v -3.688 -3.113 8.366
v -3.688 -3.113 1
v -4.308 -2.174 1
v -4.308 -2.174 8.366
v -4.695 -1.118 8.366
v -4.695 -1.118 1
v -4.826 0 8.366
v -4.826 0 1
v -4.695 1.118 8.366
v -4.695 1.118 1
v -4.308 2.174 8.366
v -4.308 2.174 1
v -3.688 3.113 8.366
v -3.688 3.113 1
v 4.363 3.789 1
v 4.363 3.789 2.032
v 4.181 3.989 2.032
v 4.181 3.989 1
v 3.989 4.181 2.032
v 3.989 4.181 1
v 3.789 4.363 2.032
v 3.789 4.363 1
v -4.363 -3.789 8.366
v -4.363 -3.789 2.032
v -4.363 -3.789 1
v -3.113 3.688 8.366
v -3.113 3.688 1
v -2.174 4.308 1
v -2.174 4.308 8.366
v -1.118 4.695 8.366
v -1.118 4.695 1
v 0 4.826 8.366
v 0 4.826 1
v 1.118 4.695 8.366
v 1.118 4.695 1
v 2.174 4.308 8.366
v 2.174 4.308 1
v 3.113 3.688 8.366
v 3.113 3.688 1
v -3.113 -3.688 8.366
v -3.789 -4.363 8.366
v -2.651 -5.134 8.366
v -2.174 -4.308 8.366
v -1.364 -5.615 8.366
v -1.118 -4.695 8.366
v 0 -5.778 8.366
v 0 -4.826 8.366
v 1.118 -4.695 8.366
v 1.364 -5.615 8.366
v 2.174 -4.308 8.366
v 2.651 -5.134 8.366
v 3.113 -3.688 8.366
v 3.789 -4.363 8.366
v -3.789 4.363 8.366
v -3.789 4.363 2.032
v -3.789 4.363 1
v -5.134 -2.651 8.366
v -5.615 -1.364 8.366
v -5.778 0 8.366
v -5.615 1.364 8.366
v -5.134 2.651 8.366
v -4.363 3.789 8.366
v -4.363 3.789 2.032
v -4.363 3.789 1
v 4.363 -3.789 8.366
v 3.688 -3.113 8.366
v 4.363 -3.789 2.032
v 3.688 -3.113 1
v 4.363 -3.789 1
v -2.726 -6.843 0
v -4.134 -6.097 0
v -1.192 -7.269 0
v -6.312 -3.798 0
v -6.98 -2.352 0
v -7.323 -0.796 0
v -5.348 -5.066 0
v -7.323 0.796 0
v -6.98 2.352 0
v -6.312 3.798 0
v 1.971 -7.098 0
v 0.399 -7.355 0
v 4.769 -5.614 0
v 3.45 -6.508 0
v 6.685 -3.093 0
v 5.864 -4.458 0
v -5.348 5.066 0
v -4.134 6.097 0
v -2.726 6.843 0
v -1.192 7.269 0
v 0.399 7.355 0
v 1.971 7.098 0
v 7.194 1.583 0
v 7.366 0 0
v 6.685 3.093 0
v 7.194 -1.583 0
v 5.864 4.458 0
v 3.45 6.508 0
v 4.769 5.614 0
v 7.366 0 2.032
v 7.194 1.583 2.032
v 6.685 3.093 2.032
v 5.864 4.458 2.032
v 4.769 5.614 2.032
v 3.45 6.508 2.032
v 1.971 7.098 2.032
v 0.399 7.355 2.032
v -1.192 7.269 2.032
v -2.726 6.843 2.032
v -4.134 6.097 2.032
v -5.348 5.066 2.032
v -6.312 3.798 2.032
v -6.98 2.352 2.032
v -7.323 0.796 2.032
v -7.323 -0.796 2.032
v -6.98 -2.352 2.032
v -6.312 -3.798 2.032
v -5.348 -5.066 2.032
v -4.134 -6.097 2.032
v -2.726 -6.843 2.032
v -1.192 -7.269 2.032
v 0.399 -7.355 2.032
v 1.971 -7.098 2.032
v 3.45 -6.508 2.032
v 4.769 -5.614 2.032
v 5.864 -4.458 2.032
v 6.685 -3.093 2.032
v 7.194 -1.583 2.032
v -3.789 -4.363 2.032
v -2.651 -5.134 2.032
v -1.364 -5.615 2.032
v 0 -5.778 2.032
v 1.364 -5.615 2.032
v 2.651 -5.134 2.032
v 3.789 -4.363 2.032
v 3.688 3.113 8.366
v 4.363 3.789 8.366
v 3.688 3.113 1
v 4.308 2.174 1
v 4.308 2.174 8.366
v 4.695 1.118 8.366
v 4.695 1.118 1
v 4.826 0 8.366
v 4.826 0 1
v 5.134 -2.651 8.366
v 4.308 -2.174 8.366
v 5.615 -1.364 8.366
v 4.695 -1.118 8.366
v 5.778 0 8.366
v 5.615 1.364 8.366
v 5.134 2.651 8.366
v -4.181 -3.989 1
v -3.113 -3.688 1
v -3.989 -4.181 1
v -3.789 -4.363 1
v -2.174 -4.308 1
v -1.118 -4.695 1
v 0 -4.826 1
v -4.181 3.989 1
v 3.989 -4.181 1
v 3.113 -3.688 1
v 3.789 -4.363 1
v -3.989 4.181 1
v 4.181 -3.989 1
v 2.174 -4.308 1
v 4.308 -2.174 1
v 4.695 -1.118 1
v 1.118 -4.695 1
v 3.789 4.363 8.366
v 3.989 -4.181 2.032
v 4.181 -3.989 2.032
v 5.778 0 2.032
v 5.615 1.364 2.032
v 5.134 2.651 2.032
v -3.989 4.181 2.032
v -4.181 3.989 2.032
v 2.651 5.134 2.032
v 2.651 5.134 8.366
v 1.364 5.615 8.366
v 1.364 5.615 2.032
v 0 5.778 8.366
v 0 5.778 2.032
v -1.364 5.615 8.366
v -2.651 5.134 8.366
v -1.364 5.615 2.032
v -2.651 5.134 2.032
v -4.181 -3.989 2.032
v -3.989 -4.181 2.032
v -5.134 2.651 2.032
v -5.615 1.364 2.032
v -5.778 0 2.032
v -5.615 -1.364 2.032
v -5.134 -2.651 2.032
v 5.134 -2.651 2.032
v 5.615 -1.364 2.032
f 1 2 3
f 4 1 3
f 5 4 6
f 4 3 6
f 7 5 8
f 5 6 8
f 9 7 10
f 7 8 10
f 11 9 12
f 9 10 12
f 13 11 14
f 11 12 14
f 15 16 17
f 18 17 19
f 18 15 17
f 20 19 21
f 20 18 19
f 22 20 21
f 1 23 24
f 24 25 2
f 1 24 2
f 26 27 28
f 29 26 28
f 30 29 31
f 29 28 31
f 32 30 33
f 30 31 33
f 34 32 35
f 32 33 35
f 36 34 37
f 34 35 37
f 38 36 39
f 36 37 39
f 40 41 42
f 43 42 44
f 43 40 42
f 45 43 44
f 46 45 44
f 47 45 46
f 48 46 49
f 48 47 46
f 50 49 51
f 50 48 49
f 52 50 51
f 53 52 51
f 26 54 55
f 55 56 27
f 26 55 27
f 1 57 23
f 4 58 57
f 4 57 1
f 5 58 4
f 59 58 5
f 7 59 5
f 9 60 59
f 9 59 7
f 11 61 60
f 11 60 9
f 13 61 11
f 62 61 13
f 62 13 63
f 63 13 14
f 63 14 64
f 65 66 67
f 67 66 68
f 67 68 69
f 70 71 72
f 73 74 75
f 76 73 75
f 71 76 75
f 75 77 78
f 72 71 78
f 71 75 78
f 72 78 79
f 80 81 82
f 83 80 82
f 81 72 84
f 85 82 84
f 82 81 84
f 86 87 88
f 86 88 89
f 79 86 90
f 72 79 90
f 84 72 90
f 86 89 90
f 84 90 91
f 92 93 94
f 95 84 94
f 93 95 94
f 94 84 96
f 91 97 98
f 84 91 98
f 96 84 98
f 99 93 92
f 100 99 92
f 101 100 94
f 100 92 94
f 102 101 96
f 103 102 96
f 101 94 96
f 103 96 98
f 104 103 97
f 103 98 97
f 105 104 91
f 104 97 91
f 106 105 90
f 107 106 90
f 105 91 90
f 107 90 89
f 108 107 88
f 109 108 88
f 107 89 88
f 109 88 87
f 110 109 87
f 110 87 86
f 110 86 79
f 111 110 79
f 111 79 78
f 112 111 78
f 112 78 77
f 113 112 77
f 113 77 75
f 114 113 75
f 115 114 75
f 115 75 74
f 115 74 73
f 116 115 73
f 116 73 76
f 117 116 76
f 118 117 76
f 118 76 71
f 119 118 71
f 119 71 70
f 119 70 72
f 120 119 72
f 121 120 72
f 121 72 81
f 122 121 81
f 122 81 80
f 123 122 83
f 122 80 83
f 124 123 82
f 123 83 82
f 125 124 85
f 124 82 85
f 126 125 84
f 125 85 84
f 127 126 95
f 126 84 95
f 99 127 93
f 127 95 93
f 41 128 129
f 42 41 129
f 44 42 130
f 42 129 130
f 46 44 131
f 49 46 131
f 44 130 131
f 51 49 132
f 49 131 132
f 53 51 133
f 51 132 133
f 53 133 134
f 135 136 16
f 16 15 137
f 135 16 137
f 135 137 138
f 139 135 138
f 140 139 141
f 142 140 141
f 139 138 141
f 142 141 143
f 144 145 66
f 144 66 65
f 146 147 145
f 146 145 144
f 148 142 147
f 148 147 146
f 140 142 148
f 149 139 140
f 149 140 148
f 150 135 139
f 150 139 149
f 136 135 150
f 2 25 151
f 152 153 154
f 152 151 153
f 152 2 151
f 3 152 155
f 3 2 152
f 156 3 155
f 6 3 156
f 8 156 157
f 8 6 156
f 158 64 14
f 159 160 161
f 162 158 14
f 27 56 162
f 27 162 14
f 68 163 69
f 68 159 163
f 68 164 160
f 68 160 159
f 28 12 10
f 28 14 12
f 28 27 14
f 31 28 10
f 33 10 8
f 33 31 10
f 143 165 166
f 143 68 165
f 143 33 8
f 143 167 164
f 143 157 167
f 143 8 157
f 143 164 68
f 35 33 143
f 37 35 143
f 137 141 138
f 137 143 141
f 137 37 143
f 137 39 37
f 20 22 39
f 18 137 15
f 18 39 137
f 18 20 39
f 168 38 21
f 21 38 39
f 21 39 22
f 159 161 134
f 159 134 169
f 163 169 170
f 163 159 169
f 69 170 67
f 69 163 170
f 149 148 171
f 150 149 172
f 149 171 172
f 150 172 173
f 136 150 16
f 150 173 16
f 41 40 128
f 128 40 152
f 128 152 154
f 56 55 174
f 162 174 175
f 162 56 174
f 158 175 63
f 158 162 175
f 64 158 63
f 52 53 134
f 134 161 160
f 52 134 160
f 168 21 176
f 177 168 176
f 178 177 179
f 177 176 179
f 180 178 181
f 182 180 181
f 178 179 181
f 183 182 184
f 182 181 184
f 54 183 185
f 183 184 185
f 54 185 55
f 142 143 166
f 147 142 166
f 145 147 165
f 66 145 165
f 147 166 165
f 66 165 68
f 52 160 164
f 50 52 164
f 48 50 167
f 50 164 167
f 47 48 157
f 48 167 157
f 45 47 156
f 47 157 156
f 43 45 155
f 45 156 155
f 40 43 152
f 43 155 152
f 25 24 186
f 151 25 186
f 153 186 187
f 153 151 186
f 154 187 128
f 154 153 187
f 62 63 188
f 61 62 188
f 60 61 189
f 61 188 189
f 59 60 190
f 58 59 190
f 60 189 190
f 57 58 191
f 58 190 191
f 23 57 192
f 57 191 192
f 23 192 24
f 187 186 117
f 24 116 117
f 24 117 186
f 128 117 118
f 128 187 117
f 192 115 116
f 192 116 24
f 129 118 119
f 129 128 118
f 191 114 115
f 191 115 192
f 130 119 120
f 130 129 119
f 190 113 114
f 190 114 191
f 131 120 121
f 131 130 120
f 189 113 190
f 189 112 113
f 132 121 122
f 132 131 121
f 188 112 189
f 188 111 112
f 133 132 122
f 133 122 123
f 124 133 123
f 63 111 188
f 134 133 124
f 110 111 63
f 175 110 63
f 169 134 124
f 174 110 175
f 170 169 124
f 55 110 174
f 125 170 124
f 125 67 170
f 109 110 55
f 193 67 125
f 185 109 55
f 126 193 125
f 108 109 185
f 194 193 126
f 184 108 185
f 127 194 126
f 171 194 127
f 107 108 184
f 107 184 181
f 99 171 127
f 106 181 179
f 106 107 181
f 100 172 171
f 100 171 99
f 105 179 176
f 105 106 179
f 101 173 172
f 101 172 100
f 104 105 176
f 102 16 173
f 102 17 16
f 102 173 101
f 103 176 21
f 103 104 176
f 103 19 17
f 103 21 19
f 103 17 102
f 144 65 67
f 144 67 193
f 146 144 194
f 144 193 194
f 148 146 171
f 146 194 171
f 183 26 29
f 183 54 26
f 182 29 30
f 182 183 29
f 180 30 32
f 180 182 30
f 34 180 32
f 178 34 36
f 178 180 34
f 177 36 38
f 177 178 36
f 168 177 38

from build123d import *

# Parameters (mm, degrees)
F0_R     = 7.366
F0_R_2   = 5.7785
F1_DEPTH = 1
F2_DEPTH = 2.032
F4_DEPTH = 7.366


with BuildPart() as f1:
    # F0 (on Top) → F1 (new body)
    with BuildSketch(Plane.XY):
        Circle(F0_R)
        Circle(F0_R_2, mode=Mode.SUBTRACT)
        Circle(F0_R_2)
    extrude(amount=F1_DEPTH)

    # F0 (on Top) → F2 (join)
    with BuildSketch(Plane.XY):
        Circle(F0_R)
        Circle(F0_R_2, mode=Mode.SUBTRACT)
    extrude(amount=F2_DEPTH)

    # F3 (on face) → F4 (join)
    with BuildSketch(Plane.XY.offset(1)):
        with BuildLine():
            ThreePointArc((-3.1130078892, 3.687744281), (0, 4.826), (3.1130078892, 3.687744281))
            Line((3.1130078892, 3.687744281), (3.7885305572, 4.3632669489))
            ThreePointArc((3.7885305572, 4.3632669489), (0, 5.7785), (-3.7885305572, 4.3632669489))
            Line((-3.7885305572, 4.3632669489), (-3.1130078892, 3.687744281))
        make_face()
        with BuildLine():
            ThreePointArc((-3.687744281, -3.1130078892), (-4.826, 0), (-3.687744281, 3.1130078892))
            Line((-3.687744281, 3.1130078892), (-4.3632669489, 3.7885305572))
            ThreePointArc((-4.3632669489, 3.7885305572), (-5.7785, 0), (-4.3632669489, -3.7885305572))
            Line((-4.3632669489, -3.7885305572), (-3.687744281, -3.1130078892))
        make_face()
        with BuildLine():
            Line((3.7885305572, -4.3632669489), (3.1130078892, -3.687744281))
            ThreePointArc((3.1130078892, -3.687744281), (0, -4.826), (-3.1130078892, -3.687744281))
            Line((-3.1130078892, -3.687744281), (-3.7885305572, -4.3632669489))
            ThreePointArc((-3.7885305572, -4.3632669489), (0, -5.7785), (3.7885305572, -4.3632669489))
        make_face()
        with BuildLine():
            ThreePointArc((3.687744281, 3.1130078892), (4.5325119912, 1.6572902733), (4.826, 0))
            ThreePointArc((4.826, 0), (4.5325119912, -1.6572902733), (3.687744281, -3.1130078892))
            Line((3.687744281, -3.1130078892), (4.3632669489, -3.7885305572))
            ThreePointArc((4.3632669489, -3.7885305572), (5.4131414315, -2.0221182193), (5.7785, 0))
            ThreePointArc((5.7785, 0), (5.4131414315, 2.0221182193), (4.3632669489, 3.7885305572))
            Line((4.3632669489, 3.7885305572), (3.687744281, 3.1130078892))
        make_face()
    extrude(amount=F4_DEPTH)


solid = f1.part
